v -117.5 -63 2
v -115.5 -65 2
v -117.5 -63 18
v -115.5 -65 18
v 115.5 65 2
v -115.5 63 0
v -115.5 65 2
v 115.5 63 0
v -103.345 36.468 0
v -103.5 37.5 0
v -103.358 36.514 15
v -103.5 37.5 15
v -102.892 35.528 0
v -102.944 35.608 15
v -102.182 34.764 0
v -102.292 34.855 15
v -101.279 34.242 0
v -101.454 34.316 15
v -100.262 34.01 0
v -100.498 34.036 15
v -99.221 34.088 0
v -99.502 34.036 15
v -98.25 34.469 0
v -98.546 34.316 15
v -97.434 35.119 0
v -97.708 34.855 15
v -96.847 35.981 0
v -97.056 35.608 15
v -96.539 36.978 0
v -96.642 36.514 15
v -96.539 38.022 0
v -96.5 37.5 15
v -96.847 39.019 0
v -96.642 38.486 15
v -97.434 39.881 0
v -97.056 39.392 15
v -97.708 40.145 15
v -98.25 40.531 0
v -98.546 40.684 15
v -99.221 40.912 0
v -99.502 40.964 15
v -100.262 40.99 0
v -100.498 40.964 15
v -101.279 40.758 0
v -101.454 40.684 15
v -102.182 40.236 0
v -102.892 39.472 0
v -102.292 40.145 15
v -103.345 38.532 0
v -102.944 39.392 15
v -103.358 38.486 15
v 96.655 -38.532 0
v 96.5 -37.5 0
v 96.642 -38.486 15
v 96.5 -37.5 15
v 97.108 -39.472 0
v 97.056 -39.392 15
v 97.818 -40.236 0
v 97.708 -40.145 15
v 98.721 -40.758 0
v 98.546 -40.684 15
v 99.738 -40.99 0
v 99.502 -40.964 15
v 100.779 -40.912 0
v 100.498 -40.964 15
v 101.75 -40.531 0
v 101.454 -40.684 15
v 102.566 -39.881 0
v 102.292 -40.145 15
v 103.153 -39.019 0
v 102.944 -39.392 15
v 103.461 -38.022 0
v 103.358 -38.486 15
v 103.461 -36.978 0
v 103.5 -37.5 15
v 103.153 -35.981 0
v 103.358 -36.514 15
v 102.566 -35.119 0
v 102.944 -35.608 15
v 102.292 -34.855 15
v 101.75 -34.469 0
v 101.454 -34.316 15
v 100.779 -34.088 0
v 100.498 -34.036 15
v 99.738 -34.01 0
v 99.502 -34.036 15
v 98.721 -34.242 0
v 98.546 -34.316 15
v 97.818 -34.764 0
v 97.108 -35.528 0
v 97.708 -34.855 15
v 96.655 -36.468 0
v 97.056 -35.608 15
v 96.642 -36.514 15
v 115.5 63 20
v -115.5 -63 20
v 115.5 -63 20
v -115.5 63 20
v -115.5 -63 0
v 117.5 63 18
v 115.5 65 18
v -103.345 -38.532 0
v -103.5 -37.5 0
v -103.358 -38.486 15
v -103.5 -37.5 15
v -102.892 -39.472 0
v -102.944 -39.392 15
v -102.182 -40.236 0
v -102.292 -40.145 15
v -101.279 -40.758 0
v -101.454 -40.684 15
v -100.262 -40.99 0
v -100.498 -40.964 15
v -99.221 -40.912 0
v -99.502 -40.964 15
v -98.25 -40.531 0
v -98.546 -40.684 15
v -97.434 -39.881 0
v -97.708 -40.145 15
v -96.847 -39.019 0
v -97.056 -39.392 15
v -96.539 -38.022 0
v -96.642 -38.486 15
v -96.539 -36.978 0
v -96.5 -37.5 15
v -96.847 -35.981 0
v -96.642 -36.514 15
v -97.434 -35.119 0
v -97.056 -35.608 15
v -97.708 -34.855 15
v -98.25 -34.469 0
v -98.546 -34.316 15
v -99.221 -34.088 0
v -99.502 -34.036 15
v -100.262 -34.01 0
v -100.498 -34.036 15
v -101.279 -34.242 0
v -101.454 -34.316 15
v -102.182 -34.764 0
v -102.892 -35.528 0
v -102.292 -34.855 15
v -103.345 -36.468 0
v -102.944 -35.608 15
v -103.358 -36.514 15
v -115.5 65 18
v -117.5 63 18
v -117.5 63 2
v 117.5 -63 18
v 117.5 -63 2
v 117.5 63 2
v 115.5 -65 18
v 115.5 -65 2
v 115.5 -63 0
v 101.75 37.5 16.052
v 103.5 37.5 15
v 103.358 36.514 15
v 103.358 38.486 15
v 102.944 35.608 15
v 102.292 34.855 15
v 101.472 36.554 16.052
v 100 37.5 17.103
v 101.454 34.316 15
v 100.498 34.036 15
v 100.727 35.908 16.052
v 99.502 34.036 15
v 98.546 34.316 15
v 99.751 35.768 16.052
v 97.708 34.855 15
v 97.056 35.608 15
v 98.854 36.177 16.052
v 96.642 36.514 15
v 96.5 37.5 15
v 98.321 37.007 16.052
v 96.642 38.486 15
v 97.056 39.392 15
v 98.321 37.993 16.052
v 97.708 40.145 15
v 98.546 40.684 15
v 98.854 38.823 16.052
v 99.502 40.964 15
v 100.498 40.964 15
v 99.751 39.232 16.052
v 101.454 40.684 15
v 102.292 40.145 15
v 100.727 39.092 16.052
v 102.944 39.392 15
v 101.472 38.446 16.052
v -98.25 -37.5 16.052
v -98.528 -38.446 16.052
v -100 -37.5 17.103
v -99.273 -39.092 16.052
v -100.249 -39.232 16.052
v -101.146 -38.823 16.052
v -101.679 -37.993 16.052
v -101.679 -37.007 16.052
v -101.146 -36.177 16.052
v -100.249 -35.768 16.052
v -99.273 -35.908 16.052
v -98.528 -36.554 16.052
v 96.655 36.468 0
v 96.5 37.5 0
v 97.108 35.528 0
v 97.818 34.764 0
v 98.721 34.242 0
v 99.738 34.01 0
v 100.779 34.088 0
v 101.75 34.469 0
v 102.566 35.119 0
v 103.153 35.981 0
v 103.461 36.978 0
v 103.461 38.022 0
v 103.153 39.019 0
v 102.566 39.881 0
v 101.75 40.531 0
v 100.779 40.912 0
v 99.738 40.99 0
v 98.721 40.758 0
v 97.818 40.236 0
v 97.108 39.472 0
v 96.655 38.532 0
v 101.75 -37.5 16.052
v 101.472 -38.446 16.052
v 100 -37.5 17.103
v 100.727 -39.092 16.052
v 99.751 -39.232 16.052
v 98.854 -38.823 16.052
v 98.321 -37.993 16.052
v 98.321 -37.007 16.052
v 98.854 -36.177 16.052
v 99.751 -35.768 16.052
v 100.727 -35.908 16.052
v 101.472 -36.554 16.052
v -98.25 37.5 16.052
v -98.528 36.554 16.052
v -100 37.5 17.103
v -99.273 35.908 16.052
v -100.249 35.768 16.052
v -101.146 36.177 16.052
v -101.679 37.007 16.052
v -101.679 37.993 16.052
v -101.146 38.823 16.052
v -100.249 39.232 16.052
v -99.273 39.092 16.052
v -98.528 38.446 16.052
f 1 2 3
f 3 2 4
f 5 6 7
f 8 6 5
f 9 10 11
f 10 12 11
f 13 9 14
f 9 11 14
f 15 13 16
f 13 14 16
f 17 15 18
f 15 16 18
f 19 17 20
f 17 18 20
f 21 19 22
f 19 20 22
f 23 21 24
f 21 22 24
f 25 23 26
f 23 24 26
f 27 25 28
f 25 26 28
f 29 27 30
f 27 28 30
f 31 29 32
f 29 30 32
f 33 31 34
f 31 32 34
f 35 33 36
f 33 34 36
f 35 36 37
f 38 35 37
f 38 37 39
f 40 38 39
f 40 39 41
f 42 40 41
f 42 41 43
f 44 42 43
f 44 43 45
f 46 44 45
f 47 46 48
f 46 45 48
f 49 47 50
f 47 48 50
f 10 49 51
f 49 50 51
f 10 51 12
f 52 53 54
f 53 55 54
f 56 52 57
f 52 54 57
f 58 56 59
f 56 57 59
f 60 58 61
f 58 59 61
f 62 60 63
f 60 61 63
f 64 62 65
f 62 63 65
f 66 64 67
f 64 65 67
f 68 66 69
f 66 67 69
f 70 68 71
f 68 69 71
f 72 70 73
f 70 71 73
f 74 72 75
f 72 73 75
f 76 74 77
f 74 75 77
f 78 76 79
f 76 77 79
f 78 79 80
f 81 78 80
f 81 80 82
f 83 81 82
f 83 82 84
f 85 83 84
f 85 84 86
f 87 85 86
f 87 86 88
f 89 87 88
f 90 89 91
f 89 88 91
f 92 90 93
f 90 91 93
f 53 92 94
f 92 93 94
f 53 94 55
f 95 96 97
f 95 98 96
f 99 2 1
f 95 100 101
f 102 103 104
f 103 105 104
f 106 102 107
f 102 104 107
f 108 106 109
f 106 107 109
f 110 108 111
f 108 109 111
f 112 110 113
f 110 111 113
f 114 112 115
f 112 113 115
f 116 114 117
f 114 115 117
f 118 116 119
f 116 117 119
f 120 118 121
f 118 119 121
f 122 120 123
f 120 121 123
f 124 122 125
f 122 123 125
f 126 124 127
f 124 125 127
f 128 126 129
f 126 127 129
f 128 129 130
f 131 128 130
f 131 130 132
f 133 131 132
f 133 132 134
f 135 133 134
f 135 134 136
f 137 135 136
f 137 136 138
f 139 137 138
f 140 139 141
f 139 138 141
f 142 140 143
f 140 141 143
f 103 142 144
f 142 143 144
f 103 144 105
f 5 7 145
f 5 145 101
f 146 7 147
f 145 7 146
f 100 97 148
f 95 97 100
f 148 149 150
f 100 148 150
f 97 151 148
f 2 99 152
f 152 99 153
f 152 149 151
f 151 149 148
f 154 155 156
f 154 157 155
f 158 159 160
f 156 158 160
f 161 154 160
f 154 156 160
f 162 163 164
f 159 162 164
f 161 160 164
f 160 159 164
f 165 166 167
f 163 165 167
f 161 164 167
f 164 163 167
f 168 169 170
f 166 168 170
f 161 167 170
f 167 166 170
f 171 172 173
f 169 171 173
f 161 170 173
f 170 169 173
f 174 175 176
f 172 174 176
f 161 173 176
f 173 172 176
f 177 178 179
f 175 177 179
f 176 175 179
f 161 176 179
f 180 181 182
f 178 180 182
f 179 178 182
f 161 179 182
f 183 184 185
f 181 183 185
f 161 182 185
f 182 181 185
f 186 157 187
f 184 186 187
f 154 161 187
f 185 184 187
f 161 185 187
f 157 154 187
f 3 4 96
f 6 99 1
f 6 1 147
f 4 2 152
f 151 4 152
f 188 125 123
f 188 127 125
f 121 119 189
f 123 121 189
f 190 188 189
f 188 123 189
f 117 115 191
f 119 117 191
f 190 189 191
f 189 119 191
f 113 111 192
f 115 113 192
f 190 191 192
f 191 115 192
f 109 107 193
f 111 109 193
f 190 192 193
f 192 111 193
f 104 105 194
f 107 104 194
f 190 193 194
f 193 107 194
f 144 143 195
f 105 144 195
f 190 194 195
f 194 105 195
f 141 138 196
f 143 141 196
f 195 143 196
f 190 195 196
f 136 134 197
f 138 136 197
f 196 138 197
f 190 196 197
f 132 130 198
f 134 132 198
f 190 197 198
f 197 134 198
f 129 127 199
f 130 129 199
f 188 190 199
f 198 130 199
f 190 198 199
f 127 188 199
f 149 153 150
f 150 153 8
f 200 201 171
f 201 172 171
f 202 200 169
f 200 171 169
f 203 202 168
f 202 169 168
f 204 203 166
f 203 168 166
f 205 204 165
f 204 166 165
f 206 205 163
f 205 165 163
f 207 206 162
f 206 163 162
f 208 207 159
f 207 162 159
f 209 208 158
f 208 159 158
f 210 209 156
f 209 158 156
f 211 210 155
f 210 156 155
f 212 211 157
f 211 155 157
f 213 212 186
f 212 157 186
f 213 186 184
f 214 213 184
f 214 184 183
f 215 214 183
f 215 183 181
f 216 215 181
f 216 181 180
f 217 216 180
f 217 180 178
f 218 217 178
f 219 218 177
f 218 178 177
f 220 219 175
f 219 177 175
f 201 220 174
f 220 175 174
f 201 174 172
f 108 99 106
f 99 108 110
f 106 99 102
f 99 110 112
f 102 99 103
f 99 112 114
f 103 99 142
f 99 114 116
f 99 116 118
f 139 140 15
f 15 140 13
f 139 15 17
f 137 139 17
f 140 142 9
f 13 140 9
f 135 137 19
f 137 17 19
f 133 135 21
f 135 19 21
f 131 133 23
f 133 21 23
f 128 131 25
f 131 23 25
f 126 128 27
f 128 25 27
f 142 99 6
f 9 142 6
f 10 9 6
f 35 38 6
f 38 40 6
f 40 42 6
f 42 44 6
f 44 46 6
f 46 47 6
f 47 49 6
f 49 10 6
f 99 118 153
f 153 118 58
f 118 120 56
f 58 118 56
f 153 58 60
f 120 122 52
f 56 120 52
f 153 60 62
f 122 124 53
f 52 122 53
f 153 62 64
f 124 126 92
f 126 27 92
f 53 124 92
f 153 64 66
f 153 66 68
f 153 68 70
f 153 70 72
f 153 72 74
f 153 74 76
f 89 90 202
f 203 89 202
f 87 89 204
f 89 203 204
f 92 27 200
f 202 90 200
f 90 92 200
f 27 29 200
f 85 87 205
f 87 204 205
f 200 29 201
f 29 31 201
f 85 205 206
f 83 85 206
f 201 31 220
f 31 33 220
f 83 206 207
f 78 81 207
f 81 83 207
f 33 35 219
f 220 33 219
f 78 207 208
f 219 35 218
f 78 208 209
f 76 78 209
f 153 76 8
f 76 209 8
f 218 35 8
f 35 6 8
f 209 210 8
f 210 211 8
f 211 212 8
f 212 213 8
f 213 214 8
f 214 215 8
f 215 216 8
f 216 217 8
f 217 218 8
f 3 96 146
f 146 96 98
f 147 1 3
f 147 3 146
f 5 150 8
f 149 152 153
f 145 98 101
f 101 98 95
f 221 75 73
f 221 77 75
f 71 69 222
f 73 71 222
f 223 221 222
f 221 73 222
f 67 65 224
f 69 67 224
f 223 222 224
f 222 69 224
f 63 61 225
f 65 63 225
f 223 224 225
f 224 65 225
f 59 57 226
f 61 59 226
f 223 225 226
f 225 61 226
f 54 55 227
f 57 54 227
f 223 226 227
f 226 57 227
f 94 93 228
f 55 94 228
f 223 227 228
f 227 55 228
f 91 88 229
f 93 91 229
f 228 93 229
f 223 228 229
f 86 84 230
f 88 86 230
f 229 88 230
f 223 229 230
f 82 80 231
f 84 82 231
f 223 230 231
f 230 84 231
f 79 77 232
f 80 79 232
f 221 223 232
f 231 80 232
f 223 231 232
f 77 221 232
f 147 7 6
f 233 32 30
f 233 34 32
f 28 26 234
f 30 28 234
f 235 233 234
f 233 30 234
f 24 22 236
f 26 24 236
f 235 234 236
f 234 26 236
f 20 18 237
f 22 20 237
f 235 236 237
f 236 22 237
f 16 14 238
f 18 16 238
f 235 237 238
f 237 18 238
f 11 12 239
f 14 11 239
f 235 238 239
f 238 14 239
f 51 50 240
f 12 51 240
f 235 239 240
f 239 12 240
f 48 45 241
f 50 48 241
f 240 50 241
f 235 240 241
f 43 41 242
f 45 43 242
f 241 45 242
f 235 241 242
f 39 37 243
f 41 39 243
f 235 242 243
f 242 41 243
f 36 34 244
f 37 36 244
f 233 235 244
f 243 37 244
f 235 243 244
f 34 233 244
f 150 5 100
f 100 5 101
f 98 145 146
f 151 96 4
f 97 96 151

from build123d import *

# Parameters (mm, degrees)
F0_W     = 235
F0_H     = 130
F1_DEPTH = 20
F2_SIZE  = 2
F4_D     = 7
F4_DEPTH = 15
F4_TIP   = 2.1030121666


with BuildPart() as f1:
    # F0 (on Top) → F1 (new body)
    with BuildSketch(Plane.XY):
        Rectangle(F0_W, F0_H)
    extrude(amount=F1_DEPTH)

    # F2
    f2_edges = [f1.edges().sort_by_distance(p)[0] for p in [
        (-117.5, -65, 10),
        (117.5, -65, 10),
        (0, -65, 0),
        (0, -65, 20),
        (117.5, 65, 10),
        (117.5, 0, 0),
        (117.5, 0, 20),
        (-117.5, 65, 10),
        (0, 65, 0),
        (0, 65, 20),
        (-117.5, 0, 0),
        (-117.5, 0, 20),
    ]]
    chamfer(f2_edges, length=F2_SIZE)

    # F4
    with Locations(Plane(origin=(0, 0, 0), x_dir=(1, 0, 0), z_dir=(0, 0, -1))):
        with Locations((-100, -37.5), (100, -37.5), (-100, 37.5), (100, 37.5)):
            Hole(F4_D / 2, depth=F4_DEPTH)
            with Locations((0, 0, -(F4_DEPTH + F4_TIP / 2))):  # 118° drill point
                Cone(0, F4_D / 2, F4_TIP, mode=Mode.SUBTRACT)


solid = f1.part
